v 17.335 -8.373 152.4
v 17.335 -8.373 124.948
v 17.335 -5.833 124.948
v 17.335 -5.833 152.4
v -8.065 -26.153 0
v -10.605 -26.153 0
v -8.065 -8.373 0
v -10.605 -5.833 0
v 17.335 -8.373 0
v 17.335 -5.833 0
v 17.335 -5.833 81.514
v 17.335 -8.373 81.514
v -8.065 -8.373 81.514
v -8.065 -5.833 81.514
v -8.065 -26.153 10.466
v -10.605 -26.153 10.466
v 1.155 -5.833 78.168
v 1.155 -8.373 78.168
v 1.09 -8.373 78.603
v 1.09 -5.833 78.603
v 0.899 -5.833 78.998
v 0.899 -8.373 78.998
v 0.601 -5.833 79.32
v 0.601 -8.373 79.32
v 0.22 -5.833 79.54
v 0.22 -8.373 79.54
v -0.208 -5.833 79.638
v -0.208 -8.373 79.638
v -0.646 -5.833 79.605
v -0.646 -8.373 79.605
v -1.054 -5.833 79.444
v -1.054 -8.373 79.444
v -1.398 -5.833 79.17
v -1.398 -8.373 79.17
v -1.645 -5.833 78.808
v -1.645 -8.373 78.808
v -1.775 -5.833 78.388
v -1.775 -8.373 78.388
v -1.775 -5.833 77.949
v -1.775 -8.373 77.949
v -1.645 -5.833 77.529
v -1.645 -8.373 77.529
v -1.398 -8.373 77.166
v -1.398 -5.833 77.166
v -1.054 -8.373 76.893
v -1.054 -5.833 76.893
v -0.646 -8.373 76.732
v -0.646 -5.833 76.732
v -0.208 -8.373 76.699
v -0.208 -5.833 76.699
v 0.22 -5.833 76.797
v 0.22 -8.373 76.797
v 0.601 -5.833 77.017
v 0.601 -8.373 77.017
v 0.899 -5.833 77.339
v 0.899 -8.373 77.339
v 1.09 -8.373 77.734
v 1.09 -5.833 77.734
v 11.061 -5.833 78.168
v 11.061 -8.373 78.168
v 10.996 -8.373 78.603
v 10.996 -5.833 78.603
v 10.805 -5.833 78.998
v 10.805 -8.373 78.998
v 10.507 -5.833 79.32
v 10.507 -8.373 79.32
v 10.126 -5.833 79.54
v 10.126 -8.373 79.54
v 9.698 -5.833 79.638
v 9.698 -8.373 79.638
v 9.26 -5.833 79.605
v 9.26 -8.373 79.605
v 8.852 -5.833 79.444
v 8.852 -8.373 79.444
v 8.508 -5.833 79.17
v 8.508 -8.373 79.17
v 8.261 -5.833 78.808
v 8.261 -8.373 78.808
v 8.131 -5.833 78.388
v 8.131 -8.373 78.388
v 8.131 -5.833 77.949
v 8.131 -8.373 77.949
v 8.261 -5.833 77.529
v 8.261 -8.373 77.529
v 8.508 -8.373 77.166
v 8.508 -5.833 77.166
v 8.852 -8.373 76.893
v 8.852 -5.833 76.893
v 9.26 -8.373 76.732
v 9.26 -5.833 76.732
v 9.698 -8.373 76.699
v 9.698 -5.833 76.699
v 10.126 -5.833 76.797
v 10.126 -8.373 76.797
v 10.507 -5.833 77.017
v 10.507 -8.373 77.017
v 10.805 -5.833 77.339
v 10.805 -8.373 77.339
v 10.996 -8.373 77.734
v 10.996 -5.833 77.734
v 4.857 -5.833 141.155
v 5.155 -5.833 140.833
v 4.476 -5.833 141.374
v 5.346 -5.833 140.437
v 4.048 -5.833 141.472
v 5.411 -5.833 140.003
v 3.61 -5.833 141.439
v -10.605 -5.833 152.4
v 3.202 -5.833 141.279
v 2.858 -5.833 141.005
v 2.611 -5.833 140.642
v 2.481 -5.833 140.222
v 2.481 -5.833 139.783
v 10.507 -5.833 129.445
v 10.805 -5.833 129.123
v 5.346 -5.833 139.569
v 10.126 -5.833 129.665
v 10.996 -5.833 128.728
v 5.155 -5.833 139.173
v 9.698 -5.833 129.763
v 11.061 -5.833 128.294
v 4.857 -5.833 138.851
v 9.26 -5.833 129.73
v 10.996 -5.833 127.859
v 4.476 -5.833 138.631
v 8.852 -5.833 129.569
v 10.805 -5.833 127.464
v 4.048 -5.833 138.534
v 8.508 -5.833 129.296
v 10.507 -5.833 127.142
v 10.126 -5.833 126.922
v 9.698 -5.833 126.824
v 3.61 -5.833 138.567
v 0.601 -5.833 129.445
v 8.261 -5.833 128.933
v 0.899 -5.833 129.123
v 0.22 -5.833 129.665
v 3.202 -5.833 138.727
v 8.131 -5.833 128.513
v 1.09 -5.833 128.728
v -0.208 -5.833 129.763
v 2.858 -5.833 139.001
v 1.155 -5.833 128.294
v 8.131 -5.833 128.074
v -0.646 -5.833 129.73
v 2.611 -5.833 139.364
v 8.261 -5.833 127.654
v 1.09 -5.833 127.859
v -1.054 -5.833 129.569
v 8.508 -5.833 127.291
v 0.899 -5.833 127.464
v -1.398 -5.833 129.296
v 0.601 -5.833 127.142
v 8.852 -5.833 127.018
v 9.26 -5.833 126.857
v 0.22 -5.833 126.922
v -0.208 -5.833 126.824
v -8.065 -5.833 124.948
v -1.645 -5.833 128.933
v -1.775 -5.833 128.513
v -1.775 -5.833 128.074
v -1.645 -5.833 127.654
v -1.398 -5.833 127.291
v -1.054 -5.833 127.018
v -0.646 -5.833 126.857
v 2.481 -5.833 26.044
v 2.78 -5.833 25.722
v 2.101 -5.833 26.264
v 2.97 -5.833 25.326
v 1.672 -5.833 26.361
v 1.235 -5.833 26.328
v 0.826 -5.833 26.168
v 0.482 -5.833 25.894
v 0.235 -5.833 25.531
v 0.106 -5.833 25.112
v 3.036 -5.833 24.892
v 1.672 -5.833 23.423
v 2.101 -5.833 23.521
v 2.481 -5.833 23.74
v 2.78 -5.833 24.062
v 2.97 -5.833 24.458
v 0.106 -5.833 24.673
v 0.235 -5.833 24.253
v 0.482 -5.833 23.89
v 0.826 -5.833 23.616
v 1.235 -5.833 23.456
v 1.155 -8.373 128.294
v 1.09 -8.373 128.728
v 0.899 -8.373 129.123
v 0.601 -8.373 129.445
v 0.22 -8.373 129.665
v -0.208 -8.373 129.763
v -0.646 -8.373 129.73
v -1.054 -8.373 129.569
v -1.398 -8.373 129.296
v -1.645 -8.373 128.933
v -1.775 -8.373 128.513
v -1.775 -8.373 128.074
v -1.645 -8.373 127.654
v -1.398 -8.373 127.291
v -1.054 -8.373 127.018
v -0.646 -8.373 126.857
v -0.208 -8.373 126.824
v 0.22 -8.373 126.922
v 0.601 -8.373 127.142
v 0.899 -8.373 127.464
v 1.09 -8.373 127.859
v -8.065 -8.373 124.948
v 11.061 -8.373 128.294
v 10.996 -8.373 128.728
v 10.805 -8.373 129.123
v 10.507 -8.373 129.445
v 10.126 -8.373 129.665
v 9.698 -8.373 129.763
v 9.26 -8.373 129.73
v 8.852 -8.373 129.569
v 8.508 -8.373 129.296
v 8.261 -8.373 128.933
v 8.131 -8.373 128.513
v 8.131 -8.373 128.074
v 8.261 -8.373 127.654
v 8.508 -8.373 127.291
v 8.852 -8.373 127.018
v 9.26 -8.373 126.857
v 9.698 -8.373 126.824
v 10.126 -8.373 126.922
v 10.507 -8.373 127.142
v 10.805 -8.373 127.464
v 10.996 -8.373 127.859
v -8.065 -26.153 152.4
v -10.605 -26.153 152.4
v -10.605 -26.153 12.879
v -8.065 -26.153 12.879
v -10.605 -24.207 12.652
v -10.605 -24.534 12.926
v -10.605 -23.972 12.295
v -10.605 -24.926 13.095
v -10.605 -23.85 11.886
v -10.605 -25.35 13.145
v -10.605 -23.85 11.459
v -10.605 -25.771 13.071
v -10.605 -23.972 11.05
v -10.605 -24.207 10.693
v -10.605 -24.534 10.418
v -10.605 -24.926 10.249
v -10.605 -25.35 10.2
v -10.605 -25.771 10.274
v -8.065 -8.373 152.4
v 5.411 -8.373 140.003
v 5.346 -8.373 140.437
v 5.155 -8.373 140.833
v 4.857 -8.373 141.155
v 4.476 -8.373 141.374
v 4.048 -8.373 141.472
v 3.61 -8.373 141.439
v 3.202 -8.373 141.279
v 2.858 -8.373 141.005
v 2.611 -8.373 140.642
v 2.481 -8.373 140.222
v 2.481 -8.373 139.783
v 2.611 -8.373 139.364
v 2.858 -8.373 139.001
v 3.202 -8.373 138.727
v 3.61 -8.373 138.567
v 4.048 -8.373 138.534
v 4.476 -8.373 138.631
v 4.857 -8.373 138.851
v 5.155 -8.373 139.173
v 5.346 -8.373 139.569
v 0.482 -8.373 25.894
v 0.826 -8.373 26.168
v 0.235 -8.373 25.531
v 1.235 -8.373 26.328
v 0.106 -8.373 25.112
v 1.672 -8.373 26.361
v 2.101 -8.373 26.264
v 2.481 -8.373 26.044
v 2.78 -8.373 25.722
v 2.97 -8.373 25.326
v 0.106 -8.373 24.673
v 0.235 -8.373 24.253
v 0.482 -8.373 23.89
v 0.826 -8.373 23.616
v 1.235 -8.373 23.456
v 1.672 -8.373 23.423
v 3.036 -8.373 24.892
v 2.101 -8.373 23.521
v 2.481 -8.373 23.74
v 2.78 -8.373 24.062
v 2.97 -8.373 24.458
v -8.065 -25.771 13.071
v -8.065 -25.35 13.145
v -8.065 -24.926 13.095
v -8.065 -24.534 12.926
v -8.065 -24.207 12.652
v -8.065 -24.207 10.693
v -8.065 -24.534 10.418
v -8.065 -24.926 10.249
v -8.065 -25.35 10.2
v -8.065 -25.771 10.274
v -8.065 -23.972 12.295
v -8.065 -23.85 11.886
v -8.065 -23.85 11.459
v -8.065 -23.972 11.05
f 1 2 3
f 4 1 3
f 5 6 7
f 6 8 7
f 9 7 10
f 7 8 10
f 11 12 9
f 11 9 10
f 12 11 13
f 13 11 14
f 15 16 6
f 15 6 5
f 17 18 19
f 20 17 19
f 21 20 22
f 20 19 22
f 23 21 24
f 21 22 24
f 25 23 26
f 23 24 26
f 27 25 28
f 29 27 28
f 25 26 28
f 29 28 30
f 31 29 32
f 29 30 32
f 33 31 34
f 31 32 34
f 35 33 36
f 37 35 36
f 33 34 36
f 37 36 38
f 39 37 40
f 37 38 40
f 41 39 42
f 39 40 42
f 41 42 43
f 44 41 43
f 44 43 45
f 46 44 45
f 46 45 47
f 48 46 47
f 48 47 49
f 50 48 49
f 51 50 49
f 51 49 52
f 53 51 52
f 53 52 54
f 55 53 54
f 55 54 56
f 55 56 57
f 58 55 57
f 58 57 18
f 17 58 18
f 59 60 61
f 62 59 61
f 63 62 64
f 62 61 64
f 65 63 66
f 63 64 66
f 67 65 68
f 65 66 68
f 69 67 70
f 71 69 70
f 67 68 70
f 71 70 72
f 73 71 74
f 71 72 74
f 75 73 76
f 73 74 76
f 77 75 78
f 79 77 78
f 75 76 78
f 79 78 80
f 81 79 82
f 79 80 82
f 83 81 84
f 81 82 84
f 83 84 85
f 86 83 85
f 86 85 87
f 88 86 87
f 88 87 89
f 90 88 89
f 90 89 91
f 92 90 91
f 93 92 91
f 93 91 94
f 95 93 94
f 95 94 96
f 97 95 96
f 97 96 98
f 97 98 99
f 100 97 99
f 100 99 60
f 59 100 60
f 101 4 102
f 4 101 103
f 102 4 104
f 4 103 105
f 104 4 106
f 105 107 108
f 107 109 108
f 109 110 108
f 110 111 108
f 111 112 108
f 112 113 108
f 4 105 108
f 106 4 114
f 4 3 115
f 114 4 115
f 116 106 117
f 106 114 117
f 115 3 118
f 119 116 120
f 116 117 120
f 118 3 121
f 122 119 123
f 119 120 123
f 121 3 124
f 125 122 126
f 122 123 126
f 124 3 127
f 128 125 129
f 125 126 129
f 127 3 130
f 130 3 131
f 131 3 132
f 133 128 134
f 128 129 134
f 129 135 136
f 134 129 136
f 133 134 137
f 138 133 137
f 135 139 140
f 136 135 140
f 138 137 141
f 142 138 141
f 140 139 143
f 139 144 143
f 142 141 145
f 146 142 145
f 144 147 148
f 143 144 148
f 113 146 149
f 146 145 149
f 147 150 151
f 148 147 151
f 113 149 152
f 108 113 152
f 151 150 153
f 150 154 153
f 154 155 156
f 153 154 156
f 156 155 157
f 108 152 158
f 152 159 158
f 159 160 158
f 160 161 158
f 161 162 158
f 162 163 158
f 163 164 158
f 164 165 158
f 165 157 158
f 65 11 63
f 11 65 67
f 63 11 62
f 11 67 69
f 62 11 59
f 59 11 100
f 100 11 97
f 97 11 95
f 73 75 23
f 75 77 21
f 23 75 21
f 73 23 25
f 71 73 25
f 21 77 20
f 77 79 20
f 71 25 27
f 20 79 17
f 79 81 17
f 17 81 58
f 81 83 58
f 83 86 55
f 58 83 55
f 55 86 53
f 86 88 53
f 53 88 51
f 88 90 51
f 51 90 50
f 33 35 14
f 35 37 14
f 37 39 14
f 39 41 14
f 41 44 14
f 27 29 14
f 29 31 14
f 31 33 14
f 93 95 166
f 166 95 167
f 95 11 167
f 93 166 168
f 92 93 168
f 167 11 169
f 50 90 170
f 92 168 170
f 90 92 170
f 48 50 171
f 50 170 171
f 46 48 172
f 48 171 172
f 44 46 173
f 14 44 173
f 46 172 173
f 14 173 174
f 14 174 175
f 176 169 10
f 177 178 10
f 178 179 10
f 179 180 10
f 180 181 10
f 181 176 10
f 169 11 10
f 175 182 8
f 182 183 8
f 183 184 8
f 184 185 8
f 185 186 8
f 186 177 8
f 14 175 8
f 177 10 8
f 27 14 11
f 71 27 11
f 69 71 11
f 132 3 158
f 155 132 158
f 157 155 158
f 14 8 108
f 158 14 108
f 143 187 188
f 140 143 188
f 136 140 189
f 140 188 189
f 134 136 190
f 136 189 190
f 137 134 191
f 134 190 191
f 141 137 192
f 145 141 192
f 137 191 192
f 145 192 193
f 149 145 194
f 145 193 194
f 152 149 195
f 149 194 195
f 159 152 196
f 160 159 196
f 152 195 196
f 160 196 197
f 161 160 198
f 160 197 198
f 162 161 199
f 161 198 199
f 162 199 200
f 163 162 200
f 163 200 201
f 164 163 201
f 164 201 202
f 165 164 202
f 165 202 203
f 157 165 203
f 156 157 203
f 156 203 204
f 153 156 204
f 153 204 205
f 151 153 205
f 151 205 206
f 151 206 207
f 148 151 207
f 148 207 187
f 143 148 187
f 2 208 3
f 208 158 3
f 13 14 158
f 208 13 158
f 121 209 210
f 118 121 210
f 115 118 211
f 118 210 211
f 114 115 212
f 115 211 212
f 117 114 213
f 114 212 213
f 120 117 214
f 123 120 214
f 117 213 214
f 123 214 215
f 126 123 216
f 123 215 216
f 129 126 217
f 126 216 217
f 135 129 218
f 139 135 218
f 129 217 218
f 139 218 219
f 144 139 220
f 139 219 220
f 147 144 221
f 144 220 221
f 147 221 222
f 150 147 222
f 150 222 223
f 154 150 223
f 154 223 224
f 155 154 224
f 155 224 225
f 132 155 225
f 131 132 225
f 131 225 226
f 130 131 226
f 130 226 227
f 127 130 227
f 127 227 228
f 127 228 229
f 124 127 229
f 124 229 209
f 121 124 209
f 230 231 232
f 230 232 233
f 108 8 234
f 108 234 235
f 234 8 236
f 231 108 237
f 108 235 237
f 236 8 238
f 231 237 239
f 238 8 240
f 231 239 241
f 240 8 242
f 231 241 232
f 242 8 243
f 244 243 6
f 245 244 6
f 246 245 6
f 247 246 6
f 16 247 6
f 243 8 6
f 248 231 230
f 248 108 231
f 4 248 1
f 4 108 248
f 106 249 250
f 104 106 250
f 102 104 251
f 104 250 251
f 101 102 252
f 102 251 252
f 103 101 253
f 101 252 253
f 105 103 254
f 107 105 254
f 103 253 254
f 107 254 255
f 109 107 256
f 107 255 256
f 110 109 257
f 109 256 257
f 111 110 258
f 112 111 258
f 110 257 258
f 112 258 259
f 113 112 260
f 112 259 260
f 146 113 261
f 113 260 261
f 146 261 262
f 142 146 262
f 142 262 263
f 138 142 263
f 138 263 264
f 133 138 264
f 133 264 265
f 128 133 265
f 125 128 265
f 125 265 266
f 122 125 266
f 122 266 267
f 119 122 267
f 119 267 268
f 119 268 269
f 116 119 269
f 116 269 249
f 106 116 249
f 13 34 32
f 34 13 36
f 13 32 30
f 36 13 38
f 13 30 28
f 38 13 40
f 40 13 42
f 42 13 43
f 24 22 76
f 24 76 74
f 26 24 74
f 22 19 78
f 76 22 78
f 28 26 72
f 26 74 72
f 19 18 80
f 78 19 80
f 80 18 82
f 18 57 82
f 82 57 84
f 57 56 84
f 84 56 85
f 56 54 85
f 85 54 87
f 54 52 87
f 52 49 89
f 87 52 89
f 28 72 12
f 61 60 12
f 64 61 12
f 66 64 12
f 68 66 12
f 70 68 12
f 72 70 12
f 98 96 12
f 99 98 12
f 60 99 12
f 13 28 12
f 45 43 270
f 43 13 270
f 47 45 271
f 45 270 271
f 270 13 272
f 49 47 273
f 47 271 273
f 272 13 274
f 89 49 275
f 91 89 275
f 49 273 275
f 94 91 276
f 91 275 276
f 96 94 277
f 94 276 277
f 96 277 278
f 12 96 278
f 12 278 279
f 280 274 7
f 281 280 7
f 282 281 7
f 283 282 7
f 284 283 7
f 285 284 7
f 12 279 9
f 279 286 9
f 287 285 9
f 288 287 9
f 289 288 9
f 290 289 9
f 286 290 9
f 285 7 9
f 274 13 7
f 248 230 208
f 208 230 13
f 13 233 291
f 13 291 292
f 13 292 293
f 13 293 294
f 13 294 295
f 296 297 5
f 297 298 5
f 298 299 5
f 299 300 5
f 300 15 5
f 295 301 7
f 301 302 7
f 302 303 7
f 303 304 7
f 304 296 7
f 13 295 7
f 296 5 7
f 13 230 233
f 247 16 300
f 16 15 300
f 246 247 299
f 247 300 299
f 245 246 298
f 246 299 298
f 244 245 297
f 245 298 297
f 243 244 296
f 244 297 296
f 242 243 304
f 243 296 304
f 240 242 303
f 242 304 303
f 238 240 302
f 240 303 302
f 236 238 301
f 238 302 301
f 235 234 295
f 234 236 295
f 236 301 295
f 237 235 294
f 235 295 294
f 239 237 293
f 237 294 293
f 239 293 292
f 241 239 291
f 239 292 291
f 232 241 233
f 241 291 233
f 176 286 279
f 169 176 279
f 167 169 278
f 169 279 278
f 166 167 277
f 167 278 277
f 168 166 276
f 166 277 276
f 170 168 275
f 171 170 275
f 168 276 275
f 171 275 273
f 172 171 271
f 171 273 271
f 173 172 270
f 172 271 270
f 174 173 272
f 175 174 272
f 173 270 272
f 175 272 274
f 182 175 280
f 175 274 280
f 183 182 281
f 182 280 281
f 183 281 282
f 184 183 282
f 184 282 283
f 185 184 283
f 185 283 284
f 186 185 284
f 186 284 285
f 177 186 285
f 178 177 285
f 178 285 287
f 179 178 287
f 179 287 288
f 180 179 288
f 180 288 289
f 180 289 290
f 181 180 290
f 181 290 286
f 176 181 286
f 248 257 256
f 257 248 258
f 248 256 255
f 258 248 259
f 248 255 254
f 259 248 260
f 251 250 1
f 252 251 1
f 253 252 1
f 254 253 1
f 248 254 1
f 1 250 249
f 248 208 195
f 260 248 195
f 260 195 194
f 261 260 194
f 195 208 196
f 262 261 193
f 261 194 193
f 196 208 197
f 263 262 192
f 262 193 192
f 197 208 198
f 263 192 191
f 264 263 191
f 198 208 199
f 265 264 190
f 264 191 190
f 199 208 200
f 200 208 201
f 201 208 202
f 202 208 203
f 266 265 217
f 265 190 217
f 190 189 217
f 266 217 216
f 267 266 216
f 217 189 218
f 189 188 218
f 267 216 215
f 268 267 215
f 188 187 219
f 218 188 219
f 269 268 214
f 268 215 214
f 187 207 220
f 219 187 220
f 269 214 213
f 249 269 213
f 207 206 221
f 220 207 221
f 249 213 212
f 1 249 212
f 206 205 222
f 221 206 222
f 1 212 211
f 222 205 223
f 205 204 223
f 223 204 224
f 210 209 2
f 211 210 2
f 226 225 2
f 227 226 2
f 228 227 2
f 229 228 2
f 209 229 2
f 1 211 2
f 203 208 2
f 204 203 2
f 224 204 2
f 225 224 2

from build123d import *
from build123d import SkipClean  # not in build123d's __all__

# Parameters (mm, degrees)
F0_W     = 2.5400003581
F0_H     = 17.78
F0_H_2   = 2.54
F0_W_2   = 25.3999996419
F1_DEPTH = 152.4
F4_D     = 2.9464
F2_W     = 12.7
F2_H     = 21.717
F5_DEPTH = 2.54
F6_D     = 2.9464
F7_D     = 2.9464
F8_D     = 2.9464
F9_D     = 2.9464
F10_D    = 2.9464
F11_D    = 2.9464


# Not quite as in the source:
# - after a boolean that leaves OpenCascade's solid faulty, fix() repairs it
# - a feature names something its author has since deleted; it is built from what else it names


with BuildPart() as f1:
    # F0 (on Top) → F1 (new body)
    with BuildSketch(Plane.XY):
        with Locations((-9.334868336, -17.2625129279)):
            Rectangle(F0_W, F0_H)
        with Locations((-9.334868336, -7.1025129279)):
            Rectangle(F0_W, F0_H_2)
        with Locations((4.635131664, -7.1025129279)):
            Rectangle(F0_W_2, F0_H_2)
    extrude(amount=F1_DEPTH)

    # F4 (through all)
    with Locations(Plane(origin=(0, -5.8325129279, 0), x_dir=(-1, 0, 0), z_dir=(0, 1, 0))):
        with Locations((0.317868515, 78.1684368849)):
            Hole(F4_D / 2)

    # F2 (on face) → F5 (cut, symmetric)
    with BuildSketch(Plane(origin=(0, -5.8325129279, 0), x_dir=(-1, 0, 0), z_dir=(0, 1, 0))):
        with Locations((1.714868515, 114.0894710903)):
            Rectangle(F2_W, F2_H)
        with Locations((1.714868515, 92.3724710903)):
            Rectangle(F2_W, F2_H)
        with Locations((-10.985131485, 114.0894710903)):
            Rectangle(F2_W, F2_H)
        with Locations((-10.985131485, 92.3724710903)):
            Rectangle(F2_W, F2_H)
    with SkipClean():  # cleaning this boolean's faces spoils the solid; the shape is the same uncleaned
        extrude(amount=F5_DEPTH, both=True, mode=Mode.SUBTRACT)

    # F6 (through all)
    with Locations(Plane(origin=(0, -5.8325129279, 0), x_dir=(-1, 0, 0), z_dir=(0, 1, 0))):
        with Locations((0.317868515, 128.2935052958)):
            Hole(F6_D / 2)

    add(f1.part.fix(), mode=Mode.REPLACE)

    # F7 (through all)
    with Locations(Plane(origin=(0, -5.8325129279, 0), x_dir=(-1, 0, 0), z_dir=(0, 1, 0))):
        with Locations((-9.588131485, 128.2935052958)):
            Hole(F7_D / 2)

    # F8 (through all)
    with Locations(Plane(origin=(0, -5.8325129279, 0), x_dir=(-1, 0, 0), z_dir=(0, 1, 0))):
        with Locations((-9.588131485, 78.1684368849)):
            Hole(F8_D / 2)

    # F9 (through all)
    with Locations(Plane(origin=(0, -5.8325129279, 0), x_dir=(-1, 0, 0), z_dir=(0, 1, 0))):
        with Locations((-3.9381445386, 140.0028020144)):
            Hole(F9_D / 2)

    # F10 (through all)
    with Locations(Plane(origin=(0, -5.8325129279, 0), x_dir=(-1, 0, 0), z_dir=(0, 1, 0))):
        with Locations((-1.56237185, 24.8921643943)):
            Hole(F10_D / 2)

    # F11 (through all)
    with Locations(Plane(origin=(-10.604868515, 0, 0), x_dir=(0, -1, 0), z_dir=(-1, 0, 0))):
        with Locations((25.3072194755, 11.6721792147)):
            Hole(F11_D / 2)


solid = f1.part
